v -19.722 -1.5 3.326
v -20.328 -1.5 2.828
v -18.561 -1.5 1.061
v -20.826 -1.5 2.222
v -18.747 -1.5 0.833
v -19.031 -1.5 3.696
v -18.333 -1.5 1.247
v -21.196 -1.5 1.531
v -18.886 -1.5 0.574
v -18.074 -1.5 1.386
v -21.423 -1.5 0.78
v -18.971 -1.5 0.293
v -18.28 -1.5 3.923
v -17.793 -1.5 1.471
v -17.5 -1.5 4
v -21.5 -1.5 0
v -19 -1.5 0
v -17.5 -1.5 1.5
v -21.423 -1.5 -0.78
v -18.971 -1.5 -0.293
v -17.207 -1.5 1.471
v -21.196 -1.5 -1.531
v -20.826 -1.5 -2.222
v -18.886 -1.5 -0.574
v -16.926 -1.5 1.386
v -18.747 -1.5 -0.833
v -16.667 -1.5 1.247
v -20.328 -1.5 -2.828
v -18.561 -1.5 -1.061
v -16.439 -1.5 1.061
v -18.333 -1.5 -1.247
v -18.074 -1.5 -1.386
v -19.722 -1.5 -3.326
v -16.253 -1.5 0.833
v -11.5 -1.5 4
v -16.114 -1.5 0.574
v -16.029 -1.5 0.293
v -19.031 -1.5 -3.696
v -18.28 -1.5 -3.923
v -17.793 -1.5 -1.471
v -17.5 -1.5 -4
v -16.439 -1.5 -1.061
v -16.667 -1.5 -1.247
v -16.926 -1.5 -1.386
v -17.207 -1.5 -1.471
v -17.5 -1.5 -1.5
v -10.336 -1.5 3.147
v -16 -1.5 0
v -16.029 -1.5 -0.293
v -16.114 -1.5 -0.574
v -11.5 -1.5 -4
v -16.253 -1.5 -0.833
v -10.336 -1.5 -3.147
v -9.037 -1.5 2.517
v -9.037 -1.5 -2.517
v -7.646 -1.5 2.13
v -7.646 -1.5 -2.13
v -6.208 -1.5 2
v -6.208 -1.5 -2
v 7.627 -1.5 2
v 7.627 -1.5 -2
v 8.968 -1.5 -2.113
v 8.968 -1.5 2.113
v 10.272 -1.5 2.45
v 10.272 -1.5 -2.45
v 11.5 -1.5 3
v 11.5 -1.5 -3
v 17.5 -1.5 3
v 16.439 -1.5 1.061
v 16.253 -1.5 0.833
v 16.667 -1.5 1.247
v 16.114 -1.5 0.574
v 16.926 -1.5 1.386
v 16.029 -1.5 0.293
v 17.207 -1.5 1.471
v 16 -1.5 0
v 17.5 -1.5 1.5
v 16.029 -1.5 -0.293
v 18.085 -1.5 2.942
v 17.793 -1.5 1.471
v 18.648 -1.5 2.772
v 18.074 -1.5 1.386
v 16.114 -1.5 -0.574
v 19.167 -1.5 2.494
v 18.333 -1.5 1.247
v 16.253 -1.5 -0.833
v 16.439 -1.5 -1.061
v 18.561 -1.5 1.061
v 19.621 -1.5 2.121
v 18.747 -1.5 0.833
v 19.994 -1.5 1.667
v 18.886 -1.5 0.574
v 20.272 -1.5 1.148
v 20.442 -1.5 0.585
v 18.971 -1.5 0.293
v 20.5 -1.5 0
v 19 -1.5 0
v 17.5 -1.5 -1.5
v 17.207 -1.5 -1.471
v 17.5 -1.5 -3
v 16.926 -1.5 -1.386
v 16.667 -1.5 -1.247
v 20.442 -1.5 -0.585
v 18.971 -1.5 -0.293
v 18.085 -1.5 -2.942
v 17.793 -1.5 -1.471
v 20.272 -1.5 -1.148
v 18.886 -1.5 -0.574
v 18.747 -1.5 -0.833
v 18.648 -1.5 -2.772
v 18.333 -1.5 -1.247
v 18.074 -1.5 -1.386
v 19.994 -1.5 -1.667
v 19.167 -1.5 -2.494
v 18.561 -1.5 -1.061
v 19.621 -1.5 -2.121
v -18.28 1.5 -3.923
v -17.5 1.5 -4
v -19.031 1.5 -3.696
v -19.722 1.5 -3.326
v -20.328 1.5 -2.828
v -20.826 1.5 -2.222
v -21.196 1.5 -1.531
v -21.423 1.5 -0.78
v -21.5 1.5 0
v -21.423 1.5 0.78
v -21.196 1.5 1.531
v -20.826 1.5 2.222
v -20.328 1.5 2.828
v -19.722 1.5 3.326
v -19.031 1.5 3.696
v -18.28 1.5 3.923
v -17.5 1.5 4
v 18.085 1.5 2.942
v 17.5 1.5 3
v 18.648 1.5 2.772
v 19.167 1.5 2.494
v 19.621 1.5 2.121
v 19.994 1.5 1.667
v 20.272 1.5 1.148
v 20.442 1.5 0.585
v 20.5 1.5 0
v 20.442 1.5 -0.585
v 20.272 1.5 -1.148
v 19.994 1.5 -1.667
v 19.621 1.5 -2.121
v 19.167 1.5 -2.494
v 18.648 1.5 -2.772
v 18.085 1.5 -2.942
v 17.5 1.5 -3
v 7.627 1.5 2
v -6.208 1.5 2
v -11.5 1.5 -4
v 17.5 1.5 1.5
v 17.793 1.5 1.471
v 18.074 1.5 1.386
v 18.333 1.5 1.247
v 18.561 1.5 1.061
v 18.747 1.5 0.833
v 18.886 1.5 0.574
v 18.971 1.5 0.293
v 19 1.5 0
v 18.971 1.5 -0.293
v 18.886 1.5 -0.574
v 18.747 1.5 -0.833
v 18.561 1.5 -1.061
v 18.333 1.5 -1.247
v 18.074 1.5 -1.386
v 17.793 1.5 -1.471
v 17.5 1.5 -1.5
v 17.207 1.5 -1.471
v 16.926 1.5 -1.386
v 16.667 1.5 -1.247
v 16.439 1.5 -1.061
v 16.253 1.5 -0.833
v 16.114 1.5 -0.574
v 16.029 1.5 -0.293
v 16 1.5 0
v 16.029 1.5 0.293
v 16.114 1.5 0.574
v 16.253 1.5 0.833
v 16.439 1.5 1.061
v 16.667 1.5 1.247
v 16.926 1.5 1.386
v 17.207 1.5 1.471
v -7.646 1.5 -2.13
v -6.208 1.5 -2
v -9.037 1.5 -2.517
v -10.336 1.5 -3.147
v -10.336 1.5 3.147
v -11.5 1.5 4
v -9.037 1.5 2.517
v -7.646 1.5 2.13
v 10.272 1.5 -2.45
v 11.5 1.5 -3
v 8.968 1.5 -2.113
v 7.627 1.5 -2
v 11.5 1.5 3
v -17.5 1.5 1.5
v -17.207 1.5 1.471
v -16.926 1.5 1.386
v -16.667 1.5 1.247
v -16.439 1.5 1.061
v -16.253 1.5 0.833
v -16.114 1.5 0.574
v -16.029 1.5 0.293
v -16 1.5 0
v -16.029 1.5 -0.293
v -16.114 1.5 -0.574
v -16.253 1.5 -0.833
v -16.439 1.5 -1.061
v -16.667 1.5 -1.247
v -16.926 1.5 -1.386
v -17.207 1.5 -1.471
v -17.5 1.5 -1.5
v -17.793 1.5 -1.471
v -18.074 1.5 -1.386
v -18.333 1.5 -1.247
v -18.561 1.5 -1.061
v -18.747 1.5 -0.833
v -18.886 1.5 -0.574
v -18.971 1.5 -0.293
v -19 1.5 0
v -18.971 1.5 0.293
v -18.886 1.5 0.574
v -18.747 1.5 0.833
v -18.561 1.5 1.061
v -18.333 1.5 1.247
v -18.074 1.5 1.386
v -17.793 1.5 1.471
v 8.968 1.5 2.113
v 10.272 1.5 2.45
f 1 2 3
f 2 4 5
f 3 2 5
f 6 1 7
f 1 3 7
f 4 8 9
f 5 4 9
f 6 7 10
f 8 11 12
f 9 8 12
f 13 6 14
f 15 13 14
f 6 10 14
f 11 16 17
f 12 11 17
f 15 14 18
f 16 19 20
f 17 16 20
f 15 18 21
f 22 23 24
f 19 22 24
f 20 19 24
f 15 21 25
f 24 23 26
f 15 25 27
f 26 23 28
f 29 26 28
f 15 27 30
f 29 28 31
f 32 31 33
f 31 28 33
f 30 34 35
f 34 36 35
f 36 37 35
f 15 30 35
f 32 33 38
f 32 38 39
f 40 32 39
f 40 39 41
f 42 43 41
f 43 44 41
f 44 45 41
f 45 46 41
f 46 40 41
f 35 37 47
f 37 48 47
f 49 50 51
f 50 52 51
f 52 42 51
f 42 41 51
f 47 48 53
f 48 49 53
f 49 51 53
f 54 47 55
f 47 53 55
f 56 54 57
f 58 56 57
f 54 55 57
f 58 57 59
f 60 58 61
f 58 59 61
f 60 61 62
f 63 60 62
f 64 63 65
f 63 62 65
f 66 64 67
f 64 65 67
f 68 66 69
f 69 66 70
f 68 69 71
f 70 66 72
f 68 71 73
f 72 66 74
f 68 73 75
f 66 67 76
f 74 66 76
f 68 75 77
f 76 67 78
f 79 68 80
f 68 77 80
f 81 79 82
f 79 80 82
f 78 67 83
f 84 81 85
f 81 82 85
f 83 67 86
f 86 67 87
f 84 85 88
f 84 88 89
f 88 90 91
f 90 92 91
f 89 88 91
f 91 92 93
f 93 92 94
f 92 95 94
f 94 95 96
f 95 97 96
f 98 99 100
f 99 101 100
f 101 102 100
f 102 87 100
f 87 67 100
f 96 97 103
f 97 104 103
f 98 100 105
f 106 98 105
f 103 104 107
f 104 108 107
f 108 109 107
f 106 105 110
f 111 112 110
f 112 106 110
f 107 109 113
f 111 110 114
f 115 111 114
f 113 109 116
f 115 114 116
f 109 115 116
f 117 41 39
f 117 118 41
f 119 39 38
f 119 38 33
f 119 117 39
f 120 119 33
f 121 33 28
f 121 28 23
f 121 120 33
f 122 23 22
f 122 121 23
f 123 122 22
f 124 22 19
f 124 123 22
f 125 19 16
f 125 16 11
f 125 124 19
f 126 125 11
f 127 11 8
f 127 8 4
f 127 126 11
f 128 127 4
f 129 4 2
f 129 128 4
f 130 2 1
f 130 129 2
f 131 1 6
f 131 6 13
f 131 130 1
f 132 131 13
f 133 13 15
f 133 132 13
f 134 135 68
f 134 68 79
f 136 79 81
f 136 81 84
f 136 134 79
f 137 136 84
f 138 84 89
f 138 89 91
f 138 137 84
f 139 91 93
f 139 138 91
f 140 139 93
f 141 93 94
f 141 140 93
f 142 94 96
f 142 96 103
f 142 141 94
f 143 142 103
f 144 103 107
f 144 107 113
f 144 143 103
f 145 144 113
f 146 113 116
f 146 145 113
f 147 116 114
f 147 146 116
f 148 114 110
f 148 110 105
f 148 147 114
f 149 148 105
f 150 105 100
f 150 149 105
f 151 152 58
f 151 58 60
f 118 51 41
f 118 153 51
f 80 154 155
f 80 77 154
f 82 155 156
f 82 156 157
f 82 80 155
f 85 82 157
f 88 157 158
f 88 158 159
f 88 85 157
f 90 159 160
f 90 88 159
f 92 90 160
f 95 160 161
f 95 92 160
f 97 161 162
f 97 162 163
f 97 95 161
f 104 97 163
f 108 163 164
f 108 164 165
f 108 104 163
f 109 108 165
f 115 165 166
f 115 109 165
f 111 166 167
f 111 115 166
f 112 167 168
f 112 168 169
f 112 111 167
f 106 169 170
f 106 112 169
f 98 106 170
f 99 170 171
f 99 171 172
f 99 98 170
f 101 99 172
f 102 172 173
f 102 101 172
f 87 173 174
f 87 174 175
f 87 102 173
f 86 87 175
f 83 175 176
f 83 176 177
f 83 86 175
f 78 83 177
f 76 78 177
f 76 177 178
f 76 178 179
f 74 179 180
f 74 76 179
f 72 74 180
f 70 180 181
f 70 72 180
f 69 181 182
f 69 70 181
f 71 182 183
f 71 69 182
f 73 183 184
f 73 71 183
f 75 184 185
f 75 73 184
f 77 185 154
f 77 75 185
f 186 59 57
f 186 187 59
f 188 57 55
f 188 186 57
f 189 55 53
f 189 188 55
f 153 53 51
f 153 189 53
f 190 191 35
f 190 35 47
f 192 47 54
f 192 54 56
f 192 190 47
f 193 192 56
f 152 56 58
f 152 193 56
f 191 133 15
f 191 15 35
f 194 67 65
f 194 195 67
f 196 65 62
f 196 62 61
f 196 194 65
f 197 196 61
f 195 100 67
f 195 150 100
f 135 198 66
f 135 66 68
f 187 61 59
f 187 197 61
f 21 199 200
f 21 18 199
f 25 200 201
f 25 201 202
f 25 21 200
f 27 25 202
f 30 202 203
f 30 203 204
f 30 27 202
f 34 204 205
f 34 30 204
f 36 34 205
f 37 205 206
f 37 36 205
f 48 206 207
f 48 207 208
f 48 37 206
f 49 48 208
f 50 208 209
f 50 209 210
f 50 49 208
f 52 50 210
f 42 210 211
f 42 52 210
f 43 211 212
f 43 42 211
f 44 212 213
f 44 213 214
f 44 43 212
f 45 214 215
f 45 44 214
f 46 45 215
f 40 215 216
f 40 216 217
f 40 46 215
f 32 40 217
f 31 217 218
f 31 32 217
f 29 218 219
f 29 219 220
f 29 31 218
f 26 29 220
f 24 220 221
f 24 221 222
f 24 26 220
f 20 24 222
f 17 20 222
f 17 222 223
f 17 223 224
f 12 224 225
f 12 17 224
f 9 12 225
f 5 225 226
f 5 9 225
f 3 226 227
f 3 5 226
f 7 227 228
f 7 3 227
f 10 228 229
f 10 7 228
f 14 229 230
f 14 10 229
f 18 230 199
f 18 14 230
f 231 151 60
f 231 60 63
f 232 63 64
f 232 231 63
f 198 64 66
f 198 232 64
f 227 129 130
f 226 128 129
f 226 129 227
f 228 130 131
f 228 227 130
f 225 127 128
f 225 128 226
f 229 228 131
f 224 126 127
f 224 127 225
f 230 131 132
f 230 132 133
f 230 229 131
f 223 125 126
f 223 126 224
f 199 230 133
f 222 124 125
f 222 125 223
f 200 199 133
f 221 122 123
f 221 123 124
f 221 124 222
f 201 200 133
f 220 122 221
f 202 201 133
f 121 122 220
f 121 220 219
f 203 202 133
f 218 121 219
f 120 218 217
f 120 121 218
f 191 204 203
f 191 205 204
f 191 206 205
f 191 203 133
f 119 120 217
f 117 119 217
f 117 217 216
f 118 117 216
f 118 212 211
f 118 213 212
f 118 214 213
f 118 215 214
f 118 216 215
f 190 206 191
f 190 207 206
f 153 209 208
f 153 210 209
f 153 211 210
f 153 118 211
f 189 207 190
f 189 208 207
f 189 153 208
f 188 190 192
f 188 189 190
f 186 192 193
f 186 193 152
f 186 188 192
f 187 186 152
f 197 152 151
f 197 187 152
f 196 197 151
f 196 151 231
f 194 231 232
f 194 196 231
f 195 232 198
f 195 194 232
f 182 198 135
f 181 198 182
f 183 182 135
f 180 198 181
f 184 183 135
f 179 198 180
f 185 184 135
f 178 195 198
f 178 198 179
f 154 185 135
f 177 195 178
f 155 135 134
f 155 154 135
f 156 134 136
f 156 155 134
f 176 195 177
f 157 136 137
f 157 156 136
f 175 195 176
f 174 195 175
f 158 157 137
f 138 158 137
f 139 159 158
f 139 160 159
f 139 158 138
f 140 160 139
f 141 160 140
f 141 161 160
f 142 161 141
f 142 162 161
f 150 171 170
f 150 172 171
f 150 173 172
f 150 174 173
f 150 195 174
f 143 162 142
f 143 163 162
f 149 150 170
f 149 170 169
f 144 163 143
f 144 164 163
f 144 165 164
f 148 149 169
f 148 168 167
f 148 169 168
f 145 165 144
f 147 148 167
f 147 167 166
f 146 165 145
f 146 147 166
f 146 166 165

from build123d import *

# Parameters (mm, degrees)
SKETCH1_R           = 1.5
BOSS_EXTRUDE1_DEPTH = 1.5


with BuildPart() as part:
    # Sketch1 → Boss-Extrude1 (new, symmetric)
    with BuildSketch(Plane(origin=(0, 0, 0), x_dir=(1, 0, 0), z_dir=(0, 1, 0))):
        with BuildLine():
            ThreePointArc((-17.5, 4), (-21.5, 0), (-17.5, -4))
            Line((-17.5, -4), (-11.5, -4))
            ThreePointArc((-11.5, -4), (-9.036924503, -2.516685226), (-6.208497378, -2))
            Line((-6.208497378, -2), (7.627016654, -2))
            ThreePointArc((7.627016654, -2), (9.627016654, -2.254033308), (11.5, -3))
            Line((11.5, -3), (17.5, -3))
            ThreePointArc((17.5, -3), (20.5, 0), (17.5, 3))
            Line((17.5, 3), (11.5, 3))
            ThreePointArc((11.5, 3), (9.627016654, 2.254033308), (7.627016654, 2))
            Line((7.627016654, 2), (-6.208497378, 2))
            ThreePointArc((-6.208497378, 2), (-9.036924503, 2.516685226), (-11.5, 4))
            Line((-11.5, 4), (-17.5, 4))
        make_face()
        with Locations((-17.5, 0)):
            Circle(SKETCH1_R, mode=Mode.SUBTRACT)
        with Locations((17.5, 0)):
            Circle(SKETCH1_R, mode=Mode.SUBTRACT)
    extrude(amount=BOSS_EXTRUDE1_DEPTH, both=True)


solid = part.part
